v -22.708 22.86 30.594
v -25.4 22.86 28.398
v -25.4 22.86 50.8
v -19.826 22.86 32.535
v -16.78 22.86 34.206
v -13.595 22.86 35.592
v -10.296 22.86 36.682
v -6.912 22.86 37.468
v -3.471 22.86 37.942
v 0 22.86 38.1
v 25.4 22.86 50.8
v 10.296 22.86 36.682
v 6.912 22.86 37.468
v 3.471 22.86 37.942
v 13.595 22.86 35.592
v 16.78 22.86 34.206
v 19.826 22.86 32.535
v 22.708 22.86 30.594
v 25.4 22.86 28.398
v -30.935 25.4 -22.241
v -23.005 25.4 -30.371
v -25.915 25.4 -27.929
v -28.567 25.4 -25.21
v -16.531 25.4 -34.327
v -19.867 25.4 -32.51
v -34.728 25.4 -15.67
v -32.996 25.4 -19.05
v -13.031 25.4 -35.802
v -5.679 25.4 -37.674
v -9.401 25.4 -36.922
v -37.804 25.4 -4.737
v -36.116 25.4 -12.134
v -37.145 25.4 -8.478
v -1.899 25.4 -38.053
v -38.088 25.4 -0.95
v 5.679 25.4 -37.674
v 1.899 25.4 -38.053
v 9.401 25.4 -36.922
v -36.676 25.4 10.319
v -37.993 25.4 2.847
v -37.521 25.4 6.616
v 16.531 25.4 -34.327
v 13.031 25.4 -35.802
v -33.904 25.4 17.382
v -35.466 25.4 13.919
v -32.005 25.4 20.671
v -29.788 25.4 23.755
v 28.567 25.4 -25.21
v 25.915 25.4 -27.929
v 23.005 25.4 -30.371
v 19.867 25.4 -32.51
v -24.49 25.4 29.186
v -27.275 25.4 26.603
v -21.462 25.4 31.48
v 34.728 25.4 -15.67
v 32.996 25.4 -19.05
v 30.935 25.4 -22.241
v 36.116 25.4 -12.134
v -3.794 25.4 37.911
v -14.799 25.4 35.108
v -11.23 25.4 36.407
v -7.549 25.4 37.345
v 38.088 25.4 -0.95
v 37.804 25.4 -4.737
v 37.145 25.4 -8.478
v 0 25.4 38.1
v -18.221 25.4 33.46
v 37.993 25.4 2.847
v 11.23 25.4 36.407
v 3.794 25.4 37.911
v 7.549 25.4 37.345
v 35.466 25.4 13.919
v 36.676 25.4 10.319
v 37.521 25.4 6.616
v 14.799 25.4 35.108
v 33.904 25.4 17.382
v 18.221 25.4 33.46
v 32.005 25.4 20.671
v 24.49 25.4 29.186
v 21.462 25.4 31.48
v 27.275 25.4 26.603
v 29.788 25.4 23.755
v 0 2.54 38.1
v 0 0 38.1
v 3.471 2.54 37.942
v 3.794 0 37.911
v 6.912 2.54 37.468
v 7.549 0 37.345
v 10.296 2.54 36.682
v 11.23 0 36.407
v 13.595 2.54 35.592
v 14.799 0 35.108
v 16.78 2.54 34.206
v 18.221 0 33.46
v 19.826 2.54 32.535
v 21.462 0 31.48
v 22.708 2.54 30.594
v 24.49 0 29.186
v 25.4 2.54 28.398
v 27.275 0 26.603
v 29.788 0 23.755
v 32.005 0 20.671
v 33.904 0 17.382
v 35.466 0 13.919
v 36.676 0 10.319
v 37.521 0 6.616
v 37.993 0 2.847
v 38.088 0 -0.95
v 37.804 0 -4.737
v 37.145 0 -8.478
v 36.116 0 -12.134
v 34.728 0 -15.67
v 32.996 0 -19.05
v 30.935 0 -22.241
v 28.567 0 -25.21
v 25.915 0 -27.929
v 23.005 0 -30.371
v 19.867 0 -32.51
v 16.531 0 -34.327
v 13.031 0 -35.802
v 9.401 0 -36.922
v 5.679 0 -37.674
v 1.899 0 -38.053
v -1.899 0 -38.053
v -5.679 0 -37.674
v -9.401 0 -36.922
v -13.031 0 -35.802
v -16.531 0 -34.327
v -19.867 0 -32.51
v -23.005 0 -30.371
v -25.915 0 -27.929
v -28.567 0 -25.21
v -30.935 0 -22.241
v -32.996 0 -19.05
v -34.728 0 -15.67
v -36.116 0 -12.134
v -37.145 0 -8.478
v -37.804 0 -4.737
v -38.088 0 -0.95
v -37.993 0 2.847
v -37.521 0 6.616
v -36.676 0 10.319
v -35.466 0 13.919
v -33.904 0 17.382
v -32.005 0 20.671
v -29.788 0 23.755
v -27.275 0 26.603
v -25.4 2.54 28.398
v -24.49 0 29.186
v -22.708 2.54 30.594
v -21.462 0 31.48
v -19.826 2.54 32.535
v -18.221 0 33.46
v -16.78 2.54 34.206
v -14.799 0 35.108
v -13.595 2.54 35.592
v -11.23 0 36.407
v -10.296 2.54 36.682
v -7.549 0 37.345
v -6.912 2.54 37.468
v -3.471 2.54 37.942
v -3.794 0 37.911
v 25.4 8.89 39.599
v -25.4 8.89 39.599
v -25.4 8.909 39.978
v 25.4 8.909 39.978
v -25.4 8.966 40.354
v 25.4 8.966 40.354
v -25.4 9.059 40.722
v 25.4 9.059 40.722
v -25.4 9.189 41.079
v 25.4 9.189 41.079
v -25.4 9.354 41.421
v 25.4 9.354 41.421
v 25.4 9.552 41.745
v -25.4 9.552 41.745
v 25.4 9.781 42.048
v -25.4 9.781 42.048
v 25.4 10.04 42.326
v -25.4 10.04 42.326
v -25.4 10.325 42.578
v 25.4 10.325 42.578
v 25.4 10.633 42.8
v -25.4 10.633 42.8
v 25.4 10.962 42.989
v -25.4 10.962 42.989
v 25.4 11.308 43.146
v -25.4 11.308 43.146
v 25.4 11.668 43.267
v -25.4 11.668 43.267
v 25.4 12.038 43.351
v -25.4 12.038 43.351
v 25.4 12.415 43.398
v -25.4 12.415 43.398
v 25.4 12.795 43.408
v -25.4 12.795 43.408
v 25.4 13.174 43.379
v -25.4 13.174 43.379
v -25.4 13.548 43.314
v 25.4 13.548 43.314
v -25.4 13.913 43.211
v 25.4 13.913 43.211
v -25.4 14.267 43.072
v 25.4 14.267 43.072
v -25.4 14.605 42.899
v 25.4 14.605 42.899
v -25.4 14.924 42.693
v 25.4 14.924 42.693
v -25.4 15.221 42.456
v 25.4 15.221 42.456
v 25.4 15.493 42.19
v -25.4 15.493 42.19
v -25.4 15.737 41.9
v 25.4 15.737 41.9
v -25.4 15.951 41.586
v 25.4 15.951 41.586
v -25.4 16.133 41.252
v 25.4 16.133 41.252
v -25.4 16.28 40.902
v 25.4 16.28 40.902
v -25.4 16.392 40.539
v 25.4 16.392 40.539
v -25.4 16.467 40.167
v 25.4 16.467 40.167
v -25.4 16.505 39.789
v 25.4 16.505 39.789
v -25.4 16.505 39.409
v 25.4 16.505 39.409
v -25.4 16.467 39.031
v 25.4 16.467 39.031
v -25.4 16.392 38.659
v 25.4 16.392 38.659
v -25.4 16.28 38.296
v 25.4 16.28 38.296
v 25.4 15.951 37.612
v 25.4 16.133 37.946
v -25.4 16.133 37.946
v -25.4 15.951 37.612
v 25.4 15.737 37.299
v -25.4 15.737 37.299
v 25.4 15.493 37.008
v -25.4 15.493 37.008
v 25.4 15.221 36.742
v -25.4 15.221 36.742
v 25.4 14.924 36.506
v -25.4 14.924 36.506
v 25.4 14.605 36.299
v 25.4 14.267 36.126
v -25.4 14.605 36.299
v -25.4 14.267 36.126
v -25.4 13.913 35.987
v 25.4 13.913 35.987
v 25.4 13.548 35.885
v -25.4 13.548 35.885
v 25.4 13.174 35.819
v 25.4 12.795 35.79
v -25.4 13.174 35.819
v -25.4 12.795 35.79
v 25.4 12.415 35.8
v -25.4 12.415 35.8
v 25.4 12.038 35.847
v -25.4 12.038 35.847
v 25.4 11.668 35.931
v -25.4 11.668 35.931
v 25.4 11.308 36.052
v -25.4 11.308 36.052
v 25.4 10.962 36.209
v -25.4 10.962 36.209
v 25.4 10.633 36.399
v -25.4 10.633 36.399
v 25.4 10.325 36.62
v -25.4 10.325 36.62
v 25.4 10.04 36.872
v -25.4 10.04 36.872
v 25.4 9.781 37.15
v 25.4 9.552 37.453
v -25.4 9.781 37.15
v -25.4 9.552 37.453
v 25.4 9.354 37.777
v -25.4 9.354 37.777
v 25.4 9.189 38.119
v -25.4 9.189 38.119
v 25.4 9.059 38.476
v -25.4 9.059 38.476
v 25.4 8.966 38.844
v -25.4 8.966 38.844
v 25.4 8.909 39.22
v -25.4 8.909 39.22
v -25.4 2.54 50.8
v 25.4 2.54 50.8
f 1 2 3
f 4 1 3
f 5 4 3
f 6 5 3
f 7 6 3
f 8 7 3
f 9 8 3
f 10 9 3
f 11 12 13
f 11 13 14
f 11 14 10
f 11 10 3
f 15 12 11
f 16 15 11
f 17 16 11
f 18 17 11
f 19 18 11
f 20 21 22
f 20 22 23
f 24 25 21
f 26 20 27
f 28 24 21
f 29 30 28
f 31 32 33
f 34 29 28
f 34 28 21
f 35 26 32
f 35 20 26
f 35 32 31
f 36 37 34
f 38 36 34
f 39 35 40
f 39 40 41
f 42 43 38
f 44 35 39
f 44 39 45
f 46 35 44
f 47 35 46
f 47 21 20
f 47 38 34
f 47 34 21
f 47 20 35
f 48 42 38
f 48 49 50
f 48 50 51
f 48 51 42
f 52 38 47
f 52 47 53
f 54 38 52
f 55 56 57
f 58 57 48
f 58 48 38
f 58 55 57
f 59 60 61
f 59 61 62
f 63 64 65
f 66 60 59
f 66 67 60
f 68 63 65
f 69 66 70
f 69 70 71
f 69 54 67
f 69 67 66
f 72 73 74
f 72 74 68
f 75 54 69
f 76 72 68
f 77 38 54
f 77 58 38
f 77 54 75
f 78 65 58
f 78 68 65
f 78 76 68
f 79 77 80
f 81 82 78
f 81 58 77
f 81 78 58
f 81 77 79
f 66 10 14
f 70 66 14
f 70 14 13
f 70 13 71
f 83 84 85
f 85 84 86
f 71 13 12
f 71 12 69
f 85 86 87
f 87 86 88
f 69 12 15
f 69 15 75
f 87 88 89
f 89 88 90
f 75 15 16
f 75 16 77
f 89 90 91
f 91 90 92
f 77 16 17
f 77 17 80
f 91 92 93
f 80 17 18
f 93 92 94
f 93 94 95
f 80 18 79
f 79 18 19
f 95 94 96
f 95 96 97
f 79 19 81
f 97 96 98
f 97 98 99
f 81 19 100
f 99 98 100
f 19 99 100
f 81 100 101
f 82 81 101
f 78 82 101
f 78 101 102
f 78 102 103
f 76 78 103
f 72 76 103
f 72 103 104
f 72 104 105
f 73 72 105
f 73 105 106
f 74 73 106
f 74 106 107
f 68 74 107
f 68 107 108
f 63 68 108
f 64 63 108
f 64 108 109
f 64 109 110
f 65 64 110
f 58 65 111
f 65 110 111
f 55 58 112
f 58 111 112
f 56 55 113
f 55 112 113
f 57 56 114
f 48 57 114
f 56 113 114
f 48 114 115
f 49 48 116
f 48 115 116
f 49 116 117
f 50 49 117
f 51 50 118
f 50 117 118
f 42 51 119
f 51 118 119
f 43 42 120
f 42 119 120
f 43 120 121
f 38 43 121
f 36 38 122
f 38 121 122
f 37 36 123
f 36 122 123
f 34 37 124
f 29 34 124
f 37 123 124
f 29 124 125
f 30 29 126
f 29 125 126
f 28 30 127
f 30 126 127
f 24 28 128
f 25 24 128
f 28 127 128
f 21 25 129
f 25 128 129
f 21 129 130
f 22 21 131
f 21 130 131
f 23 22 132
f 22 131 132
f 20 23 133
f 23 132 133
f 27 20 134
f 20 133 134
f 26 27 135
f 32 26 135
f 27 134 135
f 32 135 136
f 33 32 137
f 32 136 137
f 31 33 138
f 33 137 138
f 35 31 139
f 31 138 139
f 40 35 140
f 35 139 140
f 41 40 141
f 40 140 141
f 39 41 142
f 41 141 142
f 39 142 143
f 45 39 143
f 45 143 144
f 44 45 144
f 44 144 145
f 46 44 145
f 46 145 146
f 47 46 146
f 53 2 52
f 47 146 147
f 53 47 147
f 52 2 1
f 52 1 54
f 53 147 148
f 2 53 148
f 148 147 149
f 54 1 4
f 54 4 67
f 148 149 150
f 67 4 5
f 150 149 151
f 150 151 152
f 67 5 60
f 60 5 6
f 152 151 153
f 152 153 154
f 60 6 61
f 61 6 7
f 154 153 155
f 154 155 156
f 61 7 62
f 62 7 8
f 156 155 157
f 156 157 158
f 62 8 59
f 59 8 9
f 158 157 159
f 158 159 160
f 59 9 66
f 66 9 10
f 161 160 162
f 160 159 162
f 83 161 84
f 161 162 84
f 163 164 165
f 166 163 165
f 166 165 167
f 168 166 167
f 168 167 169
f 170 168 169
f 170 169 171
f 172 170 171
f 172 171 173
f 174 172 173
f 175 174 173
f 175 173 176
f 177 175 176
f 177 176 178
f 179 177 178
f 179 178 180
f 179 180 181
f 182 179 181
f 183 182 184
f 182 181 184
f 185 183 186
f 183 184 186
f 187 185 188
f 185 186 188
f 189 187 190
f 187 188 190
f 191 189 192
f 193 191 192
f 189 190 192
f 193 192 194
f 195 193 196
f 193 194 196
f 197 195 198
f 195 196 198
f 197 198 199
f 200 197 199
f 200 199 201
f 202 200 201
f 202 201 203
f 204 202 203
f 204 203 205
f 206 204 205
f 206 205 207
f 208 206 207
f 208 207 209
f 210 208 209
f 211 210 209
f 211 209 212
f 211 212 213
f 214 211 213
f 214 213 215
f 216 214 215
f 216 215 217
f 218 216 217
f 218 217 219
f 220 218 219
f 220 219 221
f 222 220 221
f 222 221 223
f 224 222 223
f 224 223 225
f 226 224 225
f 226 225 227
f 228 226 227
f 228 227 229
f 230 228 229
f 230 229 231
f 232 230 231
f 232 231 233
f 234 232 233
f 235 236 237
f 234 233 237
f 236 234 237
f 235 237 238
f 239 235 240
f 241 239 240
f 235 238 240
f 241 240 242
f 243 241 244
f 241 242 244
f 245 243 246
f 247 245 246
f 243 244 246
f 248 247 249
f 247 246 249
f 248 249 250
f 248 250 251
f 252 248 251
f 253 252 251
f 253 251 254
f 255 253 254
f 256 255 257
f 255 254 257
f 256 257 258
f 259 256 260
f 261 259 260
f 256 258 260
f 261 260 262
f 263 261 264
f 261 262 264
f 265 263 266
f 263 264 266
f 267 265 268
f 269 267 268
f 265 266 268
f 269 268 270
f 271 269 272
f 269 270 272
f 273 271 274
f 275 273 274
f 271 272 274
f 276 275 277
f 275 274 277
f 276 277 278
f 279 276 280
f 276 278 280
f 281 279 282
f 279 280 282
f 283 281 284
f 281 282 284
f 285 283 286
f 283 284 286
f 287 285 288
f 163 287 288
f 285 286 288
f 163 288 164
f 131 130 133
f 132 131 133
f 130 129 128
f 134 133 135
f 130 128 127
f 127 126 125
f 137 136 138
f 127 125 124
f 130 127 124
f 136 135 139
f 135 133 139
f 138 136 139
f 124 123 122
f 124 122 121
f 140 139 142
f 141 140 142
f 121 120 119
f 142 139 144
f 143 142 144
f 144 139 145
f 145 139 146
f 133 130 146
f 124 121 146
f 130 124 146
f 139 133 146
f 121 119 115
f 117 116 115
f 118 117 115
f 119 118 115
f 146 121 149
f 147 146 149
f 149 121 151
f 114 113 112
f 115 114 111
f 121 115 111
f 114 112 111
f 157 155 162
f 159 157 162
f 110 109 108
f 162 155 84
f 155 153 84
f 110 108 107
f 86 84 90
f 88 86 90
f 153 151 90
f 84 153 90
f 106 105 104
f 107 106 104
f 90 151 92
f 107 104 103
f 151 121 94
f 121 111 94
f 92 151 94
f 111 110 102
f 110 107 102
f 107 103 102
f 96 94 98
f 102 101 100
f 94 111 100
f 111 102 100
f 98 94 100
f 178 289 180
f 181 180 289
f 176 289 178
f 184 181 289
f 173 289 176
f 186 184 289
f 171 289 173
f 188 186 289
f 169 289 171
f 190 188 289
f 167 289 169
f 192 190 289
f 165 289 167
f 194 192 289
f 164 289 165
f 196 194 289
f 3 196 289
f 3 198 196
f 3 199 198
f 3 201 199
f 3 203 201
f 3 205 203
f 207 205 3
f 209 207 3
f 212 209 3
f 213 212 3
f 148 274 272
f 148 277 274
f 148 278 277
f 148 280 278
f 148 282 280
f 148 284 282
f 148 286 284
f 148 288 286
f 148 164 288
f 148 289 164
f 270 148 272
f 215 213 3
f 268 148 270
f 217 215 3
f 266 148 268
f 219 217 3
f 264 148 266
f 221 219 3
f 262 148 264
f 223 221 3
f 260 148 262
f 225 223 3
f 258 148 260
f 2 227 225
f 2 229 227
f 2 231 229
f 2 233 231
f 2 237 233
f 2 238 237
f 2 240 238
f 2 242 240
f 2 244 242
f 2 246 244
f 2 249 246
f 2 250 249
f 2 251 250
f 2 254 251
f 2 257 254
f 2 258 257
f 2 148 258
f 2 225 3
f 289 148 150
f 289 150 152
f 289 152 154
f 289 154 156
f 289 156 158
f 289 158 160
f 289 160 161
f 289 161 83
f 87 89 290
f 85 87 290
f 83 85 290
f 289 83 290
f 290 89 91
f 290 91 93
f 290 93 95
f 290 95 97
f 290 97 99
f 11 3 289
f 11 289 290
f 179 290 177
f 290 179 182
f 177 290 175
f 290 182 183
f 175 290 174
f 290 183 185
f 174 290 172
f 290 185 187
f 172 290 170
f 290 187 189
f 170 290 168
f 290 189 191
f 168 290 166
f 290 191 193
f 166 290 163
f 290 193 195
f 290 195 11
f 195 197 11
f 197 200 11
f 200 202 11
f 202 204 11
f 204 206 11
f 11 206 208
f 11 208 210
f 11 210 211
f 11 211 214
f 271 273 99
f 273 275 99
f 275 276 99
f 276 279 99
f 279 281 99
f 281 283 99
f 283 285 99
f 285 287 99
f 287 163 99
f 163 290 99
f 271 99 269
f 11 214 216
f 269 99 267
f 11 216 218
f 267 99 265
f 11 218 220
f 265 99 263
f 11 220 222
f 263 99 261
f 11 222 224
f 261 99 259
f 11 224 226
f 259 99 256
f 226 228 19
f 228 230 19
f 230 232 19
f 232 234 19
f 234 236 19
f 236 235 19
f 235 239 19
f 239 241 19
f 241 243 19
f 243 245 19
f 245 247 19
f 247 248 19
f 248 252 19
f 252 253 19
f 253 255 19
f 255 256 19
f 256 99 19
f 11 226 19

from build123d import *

# Parameters (mm, degrees)
SKETCH1_R           = 38.1
BOSS_EXTRUDE1_DEPTH = 25.4
SKETCH2_W           = 50.8
SKETCH2_H           = 20.32
BOSS_EXTRUDE2_DEPTH = 50.8
CUT_EXTRUDE1_REACH  = 87.194
SKETCH3_R           = 3.81


with BuildPart() as part:
    # Sketch1 → Boss-Extrude1 (new body)
    with BuildSketch(Plane(origin=(0, 0, 0), x_dir=(1, 0, 0), z_dir=(0, 1, 0))):
        with Locations(Location((0, 0, 0), (0, 0, 270))):
            Circle(SKETCH1_R)
    extrude(amount=BOSS_EXTRUDE1_DEPTH)

    # Sketch2 → Boss-Extrude2 (add)
    with BuildSketch(Plane.XY):
        with Locations((0, 12.7)):
            Rectangle(SKETCH2_W, SKETCH2_H)
    extrude(amount=BOSS_EXTRUDE2_DEPTH)

    # Sketch3 → Cut-Extrude1 (cut, up to next)
    with BuildSketch(Plane.ZY.offset(25.4), mode=Mode.PRIVATE) as cut_extrude1_sk1:
        with Locations(Location((39.599031657, 12.7, 0), (0, 0, 270))):
            Circle(SKETCH3_R)
    cut_extrude1_tool1 = extrude(cut_extrude1_sk1.sketch, amount=-CUT_EXTRUDE1_REACH, mode=Mode.PRIVATE) & part.part
    add(cut_extrude1_tool1.solids().sort_by_distance((-25.4, 12.7, 39.599032))[0], mode=Mode.SUBTRACT)


solid = part.part
